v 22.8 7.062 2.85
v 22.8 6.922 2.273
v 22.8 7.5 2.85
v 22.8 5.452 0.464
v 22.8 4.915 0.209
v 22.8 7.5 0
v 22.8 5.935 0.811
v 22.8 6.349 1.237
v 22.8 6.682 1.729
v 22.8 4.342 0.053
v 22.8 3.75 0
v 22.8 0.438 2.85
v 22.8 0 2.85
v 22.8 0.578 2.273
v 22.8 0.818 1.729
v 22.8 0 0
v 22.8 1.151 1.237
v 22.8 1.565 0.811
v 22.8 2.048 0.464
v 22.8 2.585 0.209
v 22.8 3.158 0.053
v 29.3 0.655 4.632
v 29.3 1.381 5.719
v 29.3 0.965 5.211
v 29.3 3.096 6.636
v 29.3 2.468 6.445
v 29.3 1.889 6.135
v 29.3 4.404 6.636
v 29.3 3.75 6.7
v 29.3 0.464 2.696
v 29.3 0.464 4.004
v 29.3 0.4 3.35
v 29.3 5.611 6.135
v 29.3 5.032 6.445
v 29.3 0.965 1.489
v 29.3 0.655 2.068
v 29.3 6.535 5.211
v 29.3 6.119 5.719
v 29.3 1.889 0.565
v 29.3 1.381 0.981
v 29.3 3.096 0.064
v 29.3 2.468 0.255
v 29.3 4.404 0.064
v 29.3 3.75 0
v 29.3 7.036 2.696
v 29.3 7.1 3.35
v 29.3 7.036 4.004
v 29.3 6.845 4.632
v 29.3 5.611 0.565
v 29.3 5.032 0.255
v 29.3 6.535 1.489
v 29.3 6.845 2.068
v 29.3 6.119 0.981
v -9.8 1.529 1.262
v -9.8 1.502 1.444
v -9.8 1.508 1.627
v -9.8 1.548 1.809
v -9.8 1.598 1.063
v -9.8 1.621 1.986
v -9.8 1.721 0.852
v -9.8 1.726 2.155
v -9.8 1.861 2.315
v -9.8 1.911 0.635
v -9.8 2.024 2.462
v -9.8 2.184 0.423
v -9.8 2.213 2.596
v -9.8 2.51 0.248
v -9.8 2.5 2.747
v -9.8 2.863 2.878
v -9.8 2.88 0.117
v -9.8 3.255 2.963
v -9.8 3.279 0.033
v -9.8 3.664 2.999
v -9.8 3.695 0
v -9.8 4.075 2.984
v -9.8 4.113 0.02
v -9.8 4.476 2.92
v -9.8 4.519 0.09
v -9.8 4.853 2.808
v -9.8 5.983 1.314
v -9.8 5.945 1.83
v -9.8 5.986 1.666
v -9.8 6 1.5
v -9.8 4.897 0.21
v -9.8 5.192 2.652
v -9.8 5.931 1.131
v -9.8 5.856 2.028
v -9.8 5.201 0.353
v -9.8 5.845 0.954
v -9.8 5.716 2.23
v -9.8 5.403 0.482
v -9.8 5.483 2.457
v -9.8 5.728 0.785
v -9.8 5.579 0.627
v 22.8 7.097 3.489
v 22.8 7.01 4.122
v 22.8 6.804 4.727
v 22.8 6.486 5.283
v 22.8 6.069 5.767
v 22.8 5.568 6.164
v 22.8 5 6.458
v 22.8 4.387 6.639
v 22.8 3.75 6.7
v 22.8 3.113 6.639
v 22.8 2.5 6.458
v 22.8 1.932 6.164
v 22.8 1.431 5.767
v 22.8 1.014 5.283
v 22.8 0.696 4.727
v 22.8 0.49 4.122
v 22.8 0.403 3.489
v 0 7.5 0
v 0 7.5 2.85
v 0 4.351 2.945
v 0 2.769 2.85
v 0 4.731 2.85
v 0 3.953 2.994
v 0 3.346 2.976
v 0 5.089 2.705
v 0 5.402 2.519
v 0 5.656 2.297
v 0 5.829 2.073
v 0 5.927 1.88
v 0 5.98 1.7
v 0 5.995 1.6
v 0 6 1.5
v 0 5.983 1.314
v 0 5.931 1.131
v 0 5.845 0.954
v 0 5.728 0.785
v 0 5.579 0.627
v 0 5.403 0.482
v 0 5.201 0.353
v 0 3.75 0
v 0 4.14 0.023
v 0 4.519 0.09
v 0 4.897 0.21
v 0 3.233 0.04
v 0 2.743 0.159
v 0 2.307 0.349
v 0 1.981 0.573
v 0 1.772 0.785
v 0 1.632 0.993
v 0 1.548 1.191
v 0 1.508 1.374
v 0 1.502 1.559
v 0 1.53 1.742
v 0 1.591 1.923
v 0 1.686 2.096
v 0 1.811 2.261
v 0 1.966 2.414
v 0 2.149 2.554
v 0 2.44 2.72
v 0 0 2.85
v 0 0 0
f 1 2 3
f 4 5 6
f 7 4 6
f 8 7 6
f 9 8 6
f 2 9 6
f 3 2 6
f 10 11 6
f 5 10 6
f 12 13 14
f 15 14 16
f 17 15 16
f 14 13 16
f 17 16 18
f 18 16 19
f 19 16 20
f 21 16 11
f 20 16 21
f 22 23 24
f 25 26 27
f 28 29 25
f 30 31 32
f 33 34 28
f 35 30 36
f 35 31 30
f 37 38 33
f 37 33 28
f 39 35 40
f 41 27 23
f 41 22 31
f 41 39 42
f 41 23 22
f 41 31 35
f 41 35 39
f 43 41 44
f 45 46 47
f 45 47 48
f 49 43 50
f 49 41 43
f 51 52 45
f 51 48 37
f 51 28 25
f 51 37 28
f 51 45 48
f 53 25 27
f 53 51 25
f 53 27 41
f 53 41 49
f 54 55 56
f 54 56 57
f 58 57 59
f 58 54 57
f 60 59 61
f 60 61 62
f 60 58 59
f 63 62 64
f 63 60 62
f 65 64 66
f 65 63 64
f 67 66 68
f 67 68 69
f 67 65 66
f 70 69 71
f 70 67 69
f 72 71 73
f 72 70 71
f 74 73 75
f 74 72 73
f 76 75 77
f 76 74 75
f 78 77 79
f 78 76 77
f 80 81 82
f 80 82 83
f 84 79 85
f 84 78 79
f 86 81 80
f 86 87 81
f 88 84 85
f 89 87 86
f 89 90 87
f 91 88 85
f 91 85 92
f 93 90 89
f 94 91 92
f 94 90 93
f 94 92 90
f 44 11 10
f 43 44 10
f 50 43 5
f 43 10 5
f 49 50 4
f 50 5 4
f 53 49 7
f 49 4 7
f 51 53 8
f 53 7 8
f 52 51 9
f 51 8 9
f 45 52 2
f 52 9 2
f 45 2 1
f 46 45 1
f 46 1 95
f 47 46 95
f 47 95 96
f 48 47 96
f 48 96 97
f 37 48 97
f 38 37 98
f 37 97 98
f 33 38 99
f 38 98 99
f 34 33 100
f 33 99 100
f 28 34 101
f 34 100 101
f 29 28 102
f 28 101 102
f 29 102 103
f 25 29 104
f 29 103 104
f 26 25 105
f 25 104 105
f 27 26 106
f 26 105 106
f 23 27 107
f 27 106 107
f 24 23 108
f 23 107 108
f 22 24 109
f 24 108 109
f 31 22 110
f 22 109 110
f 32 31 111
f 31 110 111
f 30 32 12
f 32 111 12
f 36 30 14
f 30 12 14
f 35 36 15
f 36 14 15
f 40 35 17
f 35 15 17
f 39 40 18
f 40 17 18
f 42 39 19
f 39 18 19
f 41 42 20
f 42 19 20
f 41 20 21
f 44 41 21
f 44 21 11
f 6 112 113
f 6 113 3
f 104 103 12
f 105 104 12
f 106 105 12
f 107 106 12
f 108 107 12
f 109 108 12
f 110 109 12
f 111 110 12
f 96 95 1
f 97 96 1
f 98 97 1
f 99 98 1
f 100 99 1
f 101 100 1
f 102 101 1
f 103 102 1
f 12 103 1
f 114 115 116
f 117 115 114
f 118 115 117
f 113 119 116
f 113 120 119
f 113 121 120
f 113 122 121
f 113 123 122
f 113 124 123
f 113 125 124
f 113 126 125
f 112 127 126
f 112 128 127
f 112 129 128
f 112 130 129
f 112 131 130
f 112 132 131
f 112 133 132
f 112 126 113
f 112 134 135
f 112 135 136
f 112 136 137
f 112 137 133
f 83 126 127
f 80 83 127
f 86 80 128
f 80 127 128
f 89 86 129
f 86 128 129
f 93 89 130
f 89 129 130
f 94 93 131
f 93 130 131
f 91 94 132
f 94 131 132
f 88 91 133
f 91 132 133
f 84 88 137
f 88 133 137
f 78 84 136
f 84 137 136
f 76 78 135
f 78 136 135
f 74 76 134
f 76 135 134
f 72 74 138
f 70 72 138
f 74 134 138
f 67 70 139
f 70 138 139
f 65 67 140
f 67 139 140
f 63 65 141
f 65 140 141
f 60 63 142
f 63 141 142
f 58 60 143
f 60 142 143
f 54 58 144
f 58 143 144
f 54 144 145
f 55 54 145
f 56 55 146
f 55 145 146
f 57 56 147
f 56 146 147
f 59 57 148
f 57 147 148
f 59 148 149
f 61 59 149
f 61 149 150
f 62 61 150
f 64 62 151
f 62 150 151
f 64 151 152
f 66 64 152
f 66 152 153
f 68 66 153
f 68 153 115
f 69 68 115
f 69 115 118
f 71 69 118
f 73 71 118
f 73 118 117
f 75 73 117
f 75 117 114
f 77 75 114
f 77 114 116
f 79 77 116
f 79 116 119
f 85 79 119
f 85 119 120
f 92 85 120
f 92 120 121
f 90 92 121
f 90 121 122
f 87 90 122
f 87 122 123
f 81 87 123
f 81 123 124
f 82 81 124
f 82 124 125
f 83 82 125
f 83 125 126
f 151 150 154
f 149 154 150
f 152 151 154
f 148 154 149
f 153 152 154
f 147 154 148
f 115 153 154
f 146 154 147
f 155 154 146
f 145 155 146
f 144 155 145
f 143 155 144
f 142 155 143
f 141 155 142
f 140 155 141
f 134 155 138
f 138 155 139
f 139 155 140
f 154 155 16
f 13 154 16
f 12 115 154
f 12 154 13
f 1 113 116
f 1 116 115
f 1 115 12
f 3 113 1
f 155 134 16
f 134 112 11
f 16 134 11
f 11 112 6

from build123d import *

# Parameters (mm, degrees)
SKETCH2_W           = 22.8
SKETCH2_H           = 7.5
BOSS_EXTRUDE1_DEPTH = 2.85
SKETCH3_R           = 3.35
BOSS_EXTRUDE2_DEPTH = 6.5
SKETCH4_RX          = 2.25
SKETCH4_RY          = 1.5
BOSS_EXTRUDE3_DEPTH = 9.8


with BuildPart() as part:
    # Sketch2 → Boss-Extrude1 (new body)
    with BuildSketch(Plane.XY):
        with Locations((11.4, 3.75)):
            Rectangle(SKETCH2_W, SKETCH2_H)
    extrude(amount=BOSS_EXTRUDE1_DEPTH)

    # Sketch3 → Boss-Extrude2 (add)
    with BuildSketch(Plane(origin=(22.8, 0, 0), x_dir=(0, 0, -1), z_dir=(1, 0, 0))):
        with Locations((-3.35, 3.75)):
            Circle(SKETCH3_R)
    extrude(amount=BOSS_EXTRUDE2_DEPTH)

    # Sketch4 → Boss-Extrude3 (add)
    with BuildSketch(Plane.ZY):
        with Locations(Location((1.5, 3.75), (0, 0, 90))):
            Ellipse(SKETCH4_RX, SKETCH4_RY)
    extrude(amount=BOSS_EXTRUDE3_DEPTH)


solid = part.part
